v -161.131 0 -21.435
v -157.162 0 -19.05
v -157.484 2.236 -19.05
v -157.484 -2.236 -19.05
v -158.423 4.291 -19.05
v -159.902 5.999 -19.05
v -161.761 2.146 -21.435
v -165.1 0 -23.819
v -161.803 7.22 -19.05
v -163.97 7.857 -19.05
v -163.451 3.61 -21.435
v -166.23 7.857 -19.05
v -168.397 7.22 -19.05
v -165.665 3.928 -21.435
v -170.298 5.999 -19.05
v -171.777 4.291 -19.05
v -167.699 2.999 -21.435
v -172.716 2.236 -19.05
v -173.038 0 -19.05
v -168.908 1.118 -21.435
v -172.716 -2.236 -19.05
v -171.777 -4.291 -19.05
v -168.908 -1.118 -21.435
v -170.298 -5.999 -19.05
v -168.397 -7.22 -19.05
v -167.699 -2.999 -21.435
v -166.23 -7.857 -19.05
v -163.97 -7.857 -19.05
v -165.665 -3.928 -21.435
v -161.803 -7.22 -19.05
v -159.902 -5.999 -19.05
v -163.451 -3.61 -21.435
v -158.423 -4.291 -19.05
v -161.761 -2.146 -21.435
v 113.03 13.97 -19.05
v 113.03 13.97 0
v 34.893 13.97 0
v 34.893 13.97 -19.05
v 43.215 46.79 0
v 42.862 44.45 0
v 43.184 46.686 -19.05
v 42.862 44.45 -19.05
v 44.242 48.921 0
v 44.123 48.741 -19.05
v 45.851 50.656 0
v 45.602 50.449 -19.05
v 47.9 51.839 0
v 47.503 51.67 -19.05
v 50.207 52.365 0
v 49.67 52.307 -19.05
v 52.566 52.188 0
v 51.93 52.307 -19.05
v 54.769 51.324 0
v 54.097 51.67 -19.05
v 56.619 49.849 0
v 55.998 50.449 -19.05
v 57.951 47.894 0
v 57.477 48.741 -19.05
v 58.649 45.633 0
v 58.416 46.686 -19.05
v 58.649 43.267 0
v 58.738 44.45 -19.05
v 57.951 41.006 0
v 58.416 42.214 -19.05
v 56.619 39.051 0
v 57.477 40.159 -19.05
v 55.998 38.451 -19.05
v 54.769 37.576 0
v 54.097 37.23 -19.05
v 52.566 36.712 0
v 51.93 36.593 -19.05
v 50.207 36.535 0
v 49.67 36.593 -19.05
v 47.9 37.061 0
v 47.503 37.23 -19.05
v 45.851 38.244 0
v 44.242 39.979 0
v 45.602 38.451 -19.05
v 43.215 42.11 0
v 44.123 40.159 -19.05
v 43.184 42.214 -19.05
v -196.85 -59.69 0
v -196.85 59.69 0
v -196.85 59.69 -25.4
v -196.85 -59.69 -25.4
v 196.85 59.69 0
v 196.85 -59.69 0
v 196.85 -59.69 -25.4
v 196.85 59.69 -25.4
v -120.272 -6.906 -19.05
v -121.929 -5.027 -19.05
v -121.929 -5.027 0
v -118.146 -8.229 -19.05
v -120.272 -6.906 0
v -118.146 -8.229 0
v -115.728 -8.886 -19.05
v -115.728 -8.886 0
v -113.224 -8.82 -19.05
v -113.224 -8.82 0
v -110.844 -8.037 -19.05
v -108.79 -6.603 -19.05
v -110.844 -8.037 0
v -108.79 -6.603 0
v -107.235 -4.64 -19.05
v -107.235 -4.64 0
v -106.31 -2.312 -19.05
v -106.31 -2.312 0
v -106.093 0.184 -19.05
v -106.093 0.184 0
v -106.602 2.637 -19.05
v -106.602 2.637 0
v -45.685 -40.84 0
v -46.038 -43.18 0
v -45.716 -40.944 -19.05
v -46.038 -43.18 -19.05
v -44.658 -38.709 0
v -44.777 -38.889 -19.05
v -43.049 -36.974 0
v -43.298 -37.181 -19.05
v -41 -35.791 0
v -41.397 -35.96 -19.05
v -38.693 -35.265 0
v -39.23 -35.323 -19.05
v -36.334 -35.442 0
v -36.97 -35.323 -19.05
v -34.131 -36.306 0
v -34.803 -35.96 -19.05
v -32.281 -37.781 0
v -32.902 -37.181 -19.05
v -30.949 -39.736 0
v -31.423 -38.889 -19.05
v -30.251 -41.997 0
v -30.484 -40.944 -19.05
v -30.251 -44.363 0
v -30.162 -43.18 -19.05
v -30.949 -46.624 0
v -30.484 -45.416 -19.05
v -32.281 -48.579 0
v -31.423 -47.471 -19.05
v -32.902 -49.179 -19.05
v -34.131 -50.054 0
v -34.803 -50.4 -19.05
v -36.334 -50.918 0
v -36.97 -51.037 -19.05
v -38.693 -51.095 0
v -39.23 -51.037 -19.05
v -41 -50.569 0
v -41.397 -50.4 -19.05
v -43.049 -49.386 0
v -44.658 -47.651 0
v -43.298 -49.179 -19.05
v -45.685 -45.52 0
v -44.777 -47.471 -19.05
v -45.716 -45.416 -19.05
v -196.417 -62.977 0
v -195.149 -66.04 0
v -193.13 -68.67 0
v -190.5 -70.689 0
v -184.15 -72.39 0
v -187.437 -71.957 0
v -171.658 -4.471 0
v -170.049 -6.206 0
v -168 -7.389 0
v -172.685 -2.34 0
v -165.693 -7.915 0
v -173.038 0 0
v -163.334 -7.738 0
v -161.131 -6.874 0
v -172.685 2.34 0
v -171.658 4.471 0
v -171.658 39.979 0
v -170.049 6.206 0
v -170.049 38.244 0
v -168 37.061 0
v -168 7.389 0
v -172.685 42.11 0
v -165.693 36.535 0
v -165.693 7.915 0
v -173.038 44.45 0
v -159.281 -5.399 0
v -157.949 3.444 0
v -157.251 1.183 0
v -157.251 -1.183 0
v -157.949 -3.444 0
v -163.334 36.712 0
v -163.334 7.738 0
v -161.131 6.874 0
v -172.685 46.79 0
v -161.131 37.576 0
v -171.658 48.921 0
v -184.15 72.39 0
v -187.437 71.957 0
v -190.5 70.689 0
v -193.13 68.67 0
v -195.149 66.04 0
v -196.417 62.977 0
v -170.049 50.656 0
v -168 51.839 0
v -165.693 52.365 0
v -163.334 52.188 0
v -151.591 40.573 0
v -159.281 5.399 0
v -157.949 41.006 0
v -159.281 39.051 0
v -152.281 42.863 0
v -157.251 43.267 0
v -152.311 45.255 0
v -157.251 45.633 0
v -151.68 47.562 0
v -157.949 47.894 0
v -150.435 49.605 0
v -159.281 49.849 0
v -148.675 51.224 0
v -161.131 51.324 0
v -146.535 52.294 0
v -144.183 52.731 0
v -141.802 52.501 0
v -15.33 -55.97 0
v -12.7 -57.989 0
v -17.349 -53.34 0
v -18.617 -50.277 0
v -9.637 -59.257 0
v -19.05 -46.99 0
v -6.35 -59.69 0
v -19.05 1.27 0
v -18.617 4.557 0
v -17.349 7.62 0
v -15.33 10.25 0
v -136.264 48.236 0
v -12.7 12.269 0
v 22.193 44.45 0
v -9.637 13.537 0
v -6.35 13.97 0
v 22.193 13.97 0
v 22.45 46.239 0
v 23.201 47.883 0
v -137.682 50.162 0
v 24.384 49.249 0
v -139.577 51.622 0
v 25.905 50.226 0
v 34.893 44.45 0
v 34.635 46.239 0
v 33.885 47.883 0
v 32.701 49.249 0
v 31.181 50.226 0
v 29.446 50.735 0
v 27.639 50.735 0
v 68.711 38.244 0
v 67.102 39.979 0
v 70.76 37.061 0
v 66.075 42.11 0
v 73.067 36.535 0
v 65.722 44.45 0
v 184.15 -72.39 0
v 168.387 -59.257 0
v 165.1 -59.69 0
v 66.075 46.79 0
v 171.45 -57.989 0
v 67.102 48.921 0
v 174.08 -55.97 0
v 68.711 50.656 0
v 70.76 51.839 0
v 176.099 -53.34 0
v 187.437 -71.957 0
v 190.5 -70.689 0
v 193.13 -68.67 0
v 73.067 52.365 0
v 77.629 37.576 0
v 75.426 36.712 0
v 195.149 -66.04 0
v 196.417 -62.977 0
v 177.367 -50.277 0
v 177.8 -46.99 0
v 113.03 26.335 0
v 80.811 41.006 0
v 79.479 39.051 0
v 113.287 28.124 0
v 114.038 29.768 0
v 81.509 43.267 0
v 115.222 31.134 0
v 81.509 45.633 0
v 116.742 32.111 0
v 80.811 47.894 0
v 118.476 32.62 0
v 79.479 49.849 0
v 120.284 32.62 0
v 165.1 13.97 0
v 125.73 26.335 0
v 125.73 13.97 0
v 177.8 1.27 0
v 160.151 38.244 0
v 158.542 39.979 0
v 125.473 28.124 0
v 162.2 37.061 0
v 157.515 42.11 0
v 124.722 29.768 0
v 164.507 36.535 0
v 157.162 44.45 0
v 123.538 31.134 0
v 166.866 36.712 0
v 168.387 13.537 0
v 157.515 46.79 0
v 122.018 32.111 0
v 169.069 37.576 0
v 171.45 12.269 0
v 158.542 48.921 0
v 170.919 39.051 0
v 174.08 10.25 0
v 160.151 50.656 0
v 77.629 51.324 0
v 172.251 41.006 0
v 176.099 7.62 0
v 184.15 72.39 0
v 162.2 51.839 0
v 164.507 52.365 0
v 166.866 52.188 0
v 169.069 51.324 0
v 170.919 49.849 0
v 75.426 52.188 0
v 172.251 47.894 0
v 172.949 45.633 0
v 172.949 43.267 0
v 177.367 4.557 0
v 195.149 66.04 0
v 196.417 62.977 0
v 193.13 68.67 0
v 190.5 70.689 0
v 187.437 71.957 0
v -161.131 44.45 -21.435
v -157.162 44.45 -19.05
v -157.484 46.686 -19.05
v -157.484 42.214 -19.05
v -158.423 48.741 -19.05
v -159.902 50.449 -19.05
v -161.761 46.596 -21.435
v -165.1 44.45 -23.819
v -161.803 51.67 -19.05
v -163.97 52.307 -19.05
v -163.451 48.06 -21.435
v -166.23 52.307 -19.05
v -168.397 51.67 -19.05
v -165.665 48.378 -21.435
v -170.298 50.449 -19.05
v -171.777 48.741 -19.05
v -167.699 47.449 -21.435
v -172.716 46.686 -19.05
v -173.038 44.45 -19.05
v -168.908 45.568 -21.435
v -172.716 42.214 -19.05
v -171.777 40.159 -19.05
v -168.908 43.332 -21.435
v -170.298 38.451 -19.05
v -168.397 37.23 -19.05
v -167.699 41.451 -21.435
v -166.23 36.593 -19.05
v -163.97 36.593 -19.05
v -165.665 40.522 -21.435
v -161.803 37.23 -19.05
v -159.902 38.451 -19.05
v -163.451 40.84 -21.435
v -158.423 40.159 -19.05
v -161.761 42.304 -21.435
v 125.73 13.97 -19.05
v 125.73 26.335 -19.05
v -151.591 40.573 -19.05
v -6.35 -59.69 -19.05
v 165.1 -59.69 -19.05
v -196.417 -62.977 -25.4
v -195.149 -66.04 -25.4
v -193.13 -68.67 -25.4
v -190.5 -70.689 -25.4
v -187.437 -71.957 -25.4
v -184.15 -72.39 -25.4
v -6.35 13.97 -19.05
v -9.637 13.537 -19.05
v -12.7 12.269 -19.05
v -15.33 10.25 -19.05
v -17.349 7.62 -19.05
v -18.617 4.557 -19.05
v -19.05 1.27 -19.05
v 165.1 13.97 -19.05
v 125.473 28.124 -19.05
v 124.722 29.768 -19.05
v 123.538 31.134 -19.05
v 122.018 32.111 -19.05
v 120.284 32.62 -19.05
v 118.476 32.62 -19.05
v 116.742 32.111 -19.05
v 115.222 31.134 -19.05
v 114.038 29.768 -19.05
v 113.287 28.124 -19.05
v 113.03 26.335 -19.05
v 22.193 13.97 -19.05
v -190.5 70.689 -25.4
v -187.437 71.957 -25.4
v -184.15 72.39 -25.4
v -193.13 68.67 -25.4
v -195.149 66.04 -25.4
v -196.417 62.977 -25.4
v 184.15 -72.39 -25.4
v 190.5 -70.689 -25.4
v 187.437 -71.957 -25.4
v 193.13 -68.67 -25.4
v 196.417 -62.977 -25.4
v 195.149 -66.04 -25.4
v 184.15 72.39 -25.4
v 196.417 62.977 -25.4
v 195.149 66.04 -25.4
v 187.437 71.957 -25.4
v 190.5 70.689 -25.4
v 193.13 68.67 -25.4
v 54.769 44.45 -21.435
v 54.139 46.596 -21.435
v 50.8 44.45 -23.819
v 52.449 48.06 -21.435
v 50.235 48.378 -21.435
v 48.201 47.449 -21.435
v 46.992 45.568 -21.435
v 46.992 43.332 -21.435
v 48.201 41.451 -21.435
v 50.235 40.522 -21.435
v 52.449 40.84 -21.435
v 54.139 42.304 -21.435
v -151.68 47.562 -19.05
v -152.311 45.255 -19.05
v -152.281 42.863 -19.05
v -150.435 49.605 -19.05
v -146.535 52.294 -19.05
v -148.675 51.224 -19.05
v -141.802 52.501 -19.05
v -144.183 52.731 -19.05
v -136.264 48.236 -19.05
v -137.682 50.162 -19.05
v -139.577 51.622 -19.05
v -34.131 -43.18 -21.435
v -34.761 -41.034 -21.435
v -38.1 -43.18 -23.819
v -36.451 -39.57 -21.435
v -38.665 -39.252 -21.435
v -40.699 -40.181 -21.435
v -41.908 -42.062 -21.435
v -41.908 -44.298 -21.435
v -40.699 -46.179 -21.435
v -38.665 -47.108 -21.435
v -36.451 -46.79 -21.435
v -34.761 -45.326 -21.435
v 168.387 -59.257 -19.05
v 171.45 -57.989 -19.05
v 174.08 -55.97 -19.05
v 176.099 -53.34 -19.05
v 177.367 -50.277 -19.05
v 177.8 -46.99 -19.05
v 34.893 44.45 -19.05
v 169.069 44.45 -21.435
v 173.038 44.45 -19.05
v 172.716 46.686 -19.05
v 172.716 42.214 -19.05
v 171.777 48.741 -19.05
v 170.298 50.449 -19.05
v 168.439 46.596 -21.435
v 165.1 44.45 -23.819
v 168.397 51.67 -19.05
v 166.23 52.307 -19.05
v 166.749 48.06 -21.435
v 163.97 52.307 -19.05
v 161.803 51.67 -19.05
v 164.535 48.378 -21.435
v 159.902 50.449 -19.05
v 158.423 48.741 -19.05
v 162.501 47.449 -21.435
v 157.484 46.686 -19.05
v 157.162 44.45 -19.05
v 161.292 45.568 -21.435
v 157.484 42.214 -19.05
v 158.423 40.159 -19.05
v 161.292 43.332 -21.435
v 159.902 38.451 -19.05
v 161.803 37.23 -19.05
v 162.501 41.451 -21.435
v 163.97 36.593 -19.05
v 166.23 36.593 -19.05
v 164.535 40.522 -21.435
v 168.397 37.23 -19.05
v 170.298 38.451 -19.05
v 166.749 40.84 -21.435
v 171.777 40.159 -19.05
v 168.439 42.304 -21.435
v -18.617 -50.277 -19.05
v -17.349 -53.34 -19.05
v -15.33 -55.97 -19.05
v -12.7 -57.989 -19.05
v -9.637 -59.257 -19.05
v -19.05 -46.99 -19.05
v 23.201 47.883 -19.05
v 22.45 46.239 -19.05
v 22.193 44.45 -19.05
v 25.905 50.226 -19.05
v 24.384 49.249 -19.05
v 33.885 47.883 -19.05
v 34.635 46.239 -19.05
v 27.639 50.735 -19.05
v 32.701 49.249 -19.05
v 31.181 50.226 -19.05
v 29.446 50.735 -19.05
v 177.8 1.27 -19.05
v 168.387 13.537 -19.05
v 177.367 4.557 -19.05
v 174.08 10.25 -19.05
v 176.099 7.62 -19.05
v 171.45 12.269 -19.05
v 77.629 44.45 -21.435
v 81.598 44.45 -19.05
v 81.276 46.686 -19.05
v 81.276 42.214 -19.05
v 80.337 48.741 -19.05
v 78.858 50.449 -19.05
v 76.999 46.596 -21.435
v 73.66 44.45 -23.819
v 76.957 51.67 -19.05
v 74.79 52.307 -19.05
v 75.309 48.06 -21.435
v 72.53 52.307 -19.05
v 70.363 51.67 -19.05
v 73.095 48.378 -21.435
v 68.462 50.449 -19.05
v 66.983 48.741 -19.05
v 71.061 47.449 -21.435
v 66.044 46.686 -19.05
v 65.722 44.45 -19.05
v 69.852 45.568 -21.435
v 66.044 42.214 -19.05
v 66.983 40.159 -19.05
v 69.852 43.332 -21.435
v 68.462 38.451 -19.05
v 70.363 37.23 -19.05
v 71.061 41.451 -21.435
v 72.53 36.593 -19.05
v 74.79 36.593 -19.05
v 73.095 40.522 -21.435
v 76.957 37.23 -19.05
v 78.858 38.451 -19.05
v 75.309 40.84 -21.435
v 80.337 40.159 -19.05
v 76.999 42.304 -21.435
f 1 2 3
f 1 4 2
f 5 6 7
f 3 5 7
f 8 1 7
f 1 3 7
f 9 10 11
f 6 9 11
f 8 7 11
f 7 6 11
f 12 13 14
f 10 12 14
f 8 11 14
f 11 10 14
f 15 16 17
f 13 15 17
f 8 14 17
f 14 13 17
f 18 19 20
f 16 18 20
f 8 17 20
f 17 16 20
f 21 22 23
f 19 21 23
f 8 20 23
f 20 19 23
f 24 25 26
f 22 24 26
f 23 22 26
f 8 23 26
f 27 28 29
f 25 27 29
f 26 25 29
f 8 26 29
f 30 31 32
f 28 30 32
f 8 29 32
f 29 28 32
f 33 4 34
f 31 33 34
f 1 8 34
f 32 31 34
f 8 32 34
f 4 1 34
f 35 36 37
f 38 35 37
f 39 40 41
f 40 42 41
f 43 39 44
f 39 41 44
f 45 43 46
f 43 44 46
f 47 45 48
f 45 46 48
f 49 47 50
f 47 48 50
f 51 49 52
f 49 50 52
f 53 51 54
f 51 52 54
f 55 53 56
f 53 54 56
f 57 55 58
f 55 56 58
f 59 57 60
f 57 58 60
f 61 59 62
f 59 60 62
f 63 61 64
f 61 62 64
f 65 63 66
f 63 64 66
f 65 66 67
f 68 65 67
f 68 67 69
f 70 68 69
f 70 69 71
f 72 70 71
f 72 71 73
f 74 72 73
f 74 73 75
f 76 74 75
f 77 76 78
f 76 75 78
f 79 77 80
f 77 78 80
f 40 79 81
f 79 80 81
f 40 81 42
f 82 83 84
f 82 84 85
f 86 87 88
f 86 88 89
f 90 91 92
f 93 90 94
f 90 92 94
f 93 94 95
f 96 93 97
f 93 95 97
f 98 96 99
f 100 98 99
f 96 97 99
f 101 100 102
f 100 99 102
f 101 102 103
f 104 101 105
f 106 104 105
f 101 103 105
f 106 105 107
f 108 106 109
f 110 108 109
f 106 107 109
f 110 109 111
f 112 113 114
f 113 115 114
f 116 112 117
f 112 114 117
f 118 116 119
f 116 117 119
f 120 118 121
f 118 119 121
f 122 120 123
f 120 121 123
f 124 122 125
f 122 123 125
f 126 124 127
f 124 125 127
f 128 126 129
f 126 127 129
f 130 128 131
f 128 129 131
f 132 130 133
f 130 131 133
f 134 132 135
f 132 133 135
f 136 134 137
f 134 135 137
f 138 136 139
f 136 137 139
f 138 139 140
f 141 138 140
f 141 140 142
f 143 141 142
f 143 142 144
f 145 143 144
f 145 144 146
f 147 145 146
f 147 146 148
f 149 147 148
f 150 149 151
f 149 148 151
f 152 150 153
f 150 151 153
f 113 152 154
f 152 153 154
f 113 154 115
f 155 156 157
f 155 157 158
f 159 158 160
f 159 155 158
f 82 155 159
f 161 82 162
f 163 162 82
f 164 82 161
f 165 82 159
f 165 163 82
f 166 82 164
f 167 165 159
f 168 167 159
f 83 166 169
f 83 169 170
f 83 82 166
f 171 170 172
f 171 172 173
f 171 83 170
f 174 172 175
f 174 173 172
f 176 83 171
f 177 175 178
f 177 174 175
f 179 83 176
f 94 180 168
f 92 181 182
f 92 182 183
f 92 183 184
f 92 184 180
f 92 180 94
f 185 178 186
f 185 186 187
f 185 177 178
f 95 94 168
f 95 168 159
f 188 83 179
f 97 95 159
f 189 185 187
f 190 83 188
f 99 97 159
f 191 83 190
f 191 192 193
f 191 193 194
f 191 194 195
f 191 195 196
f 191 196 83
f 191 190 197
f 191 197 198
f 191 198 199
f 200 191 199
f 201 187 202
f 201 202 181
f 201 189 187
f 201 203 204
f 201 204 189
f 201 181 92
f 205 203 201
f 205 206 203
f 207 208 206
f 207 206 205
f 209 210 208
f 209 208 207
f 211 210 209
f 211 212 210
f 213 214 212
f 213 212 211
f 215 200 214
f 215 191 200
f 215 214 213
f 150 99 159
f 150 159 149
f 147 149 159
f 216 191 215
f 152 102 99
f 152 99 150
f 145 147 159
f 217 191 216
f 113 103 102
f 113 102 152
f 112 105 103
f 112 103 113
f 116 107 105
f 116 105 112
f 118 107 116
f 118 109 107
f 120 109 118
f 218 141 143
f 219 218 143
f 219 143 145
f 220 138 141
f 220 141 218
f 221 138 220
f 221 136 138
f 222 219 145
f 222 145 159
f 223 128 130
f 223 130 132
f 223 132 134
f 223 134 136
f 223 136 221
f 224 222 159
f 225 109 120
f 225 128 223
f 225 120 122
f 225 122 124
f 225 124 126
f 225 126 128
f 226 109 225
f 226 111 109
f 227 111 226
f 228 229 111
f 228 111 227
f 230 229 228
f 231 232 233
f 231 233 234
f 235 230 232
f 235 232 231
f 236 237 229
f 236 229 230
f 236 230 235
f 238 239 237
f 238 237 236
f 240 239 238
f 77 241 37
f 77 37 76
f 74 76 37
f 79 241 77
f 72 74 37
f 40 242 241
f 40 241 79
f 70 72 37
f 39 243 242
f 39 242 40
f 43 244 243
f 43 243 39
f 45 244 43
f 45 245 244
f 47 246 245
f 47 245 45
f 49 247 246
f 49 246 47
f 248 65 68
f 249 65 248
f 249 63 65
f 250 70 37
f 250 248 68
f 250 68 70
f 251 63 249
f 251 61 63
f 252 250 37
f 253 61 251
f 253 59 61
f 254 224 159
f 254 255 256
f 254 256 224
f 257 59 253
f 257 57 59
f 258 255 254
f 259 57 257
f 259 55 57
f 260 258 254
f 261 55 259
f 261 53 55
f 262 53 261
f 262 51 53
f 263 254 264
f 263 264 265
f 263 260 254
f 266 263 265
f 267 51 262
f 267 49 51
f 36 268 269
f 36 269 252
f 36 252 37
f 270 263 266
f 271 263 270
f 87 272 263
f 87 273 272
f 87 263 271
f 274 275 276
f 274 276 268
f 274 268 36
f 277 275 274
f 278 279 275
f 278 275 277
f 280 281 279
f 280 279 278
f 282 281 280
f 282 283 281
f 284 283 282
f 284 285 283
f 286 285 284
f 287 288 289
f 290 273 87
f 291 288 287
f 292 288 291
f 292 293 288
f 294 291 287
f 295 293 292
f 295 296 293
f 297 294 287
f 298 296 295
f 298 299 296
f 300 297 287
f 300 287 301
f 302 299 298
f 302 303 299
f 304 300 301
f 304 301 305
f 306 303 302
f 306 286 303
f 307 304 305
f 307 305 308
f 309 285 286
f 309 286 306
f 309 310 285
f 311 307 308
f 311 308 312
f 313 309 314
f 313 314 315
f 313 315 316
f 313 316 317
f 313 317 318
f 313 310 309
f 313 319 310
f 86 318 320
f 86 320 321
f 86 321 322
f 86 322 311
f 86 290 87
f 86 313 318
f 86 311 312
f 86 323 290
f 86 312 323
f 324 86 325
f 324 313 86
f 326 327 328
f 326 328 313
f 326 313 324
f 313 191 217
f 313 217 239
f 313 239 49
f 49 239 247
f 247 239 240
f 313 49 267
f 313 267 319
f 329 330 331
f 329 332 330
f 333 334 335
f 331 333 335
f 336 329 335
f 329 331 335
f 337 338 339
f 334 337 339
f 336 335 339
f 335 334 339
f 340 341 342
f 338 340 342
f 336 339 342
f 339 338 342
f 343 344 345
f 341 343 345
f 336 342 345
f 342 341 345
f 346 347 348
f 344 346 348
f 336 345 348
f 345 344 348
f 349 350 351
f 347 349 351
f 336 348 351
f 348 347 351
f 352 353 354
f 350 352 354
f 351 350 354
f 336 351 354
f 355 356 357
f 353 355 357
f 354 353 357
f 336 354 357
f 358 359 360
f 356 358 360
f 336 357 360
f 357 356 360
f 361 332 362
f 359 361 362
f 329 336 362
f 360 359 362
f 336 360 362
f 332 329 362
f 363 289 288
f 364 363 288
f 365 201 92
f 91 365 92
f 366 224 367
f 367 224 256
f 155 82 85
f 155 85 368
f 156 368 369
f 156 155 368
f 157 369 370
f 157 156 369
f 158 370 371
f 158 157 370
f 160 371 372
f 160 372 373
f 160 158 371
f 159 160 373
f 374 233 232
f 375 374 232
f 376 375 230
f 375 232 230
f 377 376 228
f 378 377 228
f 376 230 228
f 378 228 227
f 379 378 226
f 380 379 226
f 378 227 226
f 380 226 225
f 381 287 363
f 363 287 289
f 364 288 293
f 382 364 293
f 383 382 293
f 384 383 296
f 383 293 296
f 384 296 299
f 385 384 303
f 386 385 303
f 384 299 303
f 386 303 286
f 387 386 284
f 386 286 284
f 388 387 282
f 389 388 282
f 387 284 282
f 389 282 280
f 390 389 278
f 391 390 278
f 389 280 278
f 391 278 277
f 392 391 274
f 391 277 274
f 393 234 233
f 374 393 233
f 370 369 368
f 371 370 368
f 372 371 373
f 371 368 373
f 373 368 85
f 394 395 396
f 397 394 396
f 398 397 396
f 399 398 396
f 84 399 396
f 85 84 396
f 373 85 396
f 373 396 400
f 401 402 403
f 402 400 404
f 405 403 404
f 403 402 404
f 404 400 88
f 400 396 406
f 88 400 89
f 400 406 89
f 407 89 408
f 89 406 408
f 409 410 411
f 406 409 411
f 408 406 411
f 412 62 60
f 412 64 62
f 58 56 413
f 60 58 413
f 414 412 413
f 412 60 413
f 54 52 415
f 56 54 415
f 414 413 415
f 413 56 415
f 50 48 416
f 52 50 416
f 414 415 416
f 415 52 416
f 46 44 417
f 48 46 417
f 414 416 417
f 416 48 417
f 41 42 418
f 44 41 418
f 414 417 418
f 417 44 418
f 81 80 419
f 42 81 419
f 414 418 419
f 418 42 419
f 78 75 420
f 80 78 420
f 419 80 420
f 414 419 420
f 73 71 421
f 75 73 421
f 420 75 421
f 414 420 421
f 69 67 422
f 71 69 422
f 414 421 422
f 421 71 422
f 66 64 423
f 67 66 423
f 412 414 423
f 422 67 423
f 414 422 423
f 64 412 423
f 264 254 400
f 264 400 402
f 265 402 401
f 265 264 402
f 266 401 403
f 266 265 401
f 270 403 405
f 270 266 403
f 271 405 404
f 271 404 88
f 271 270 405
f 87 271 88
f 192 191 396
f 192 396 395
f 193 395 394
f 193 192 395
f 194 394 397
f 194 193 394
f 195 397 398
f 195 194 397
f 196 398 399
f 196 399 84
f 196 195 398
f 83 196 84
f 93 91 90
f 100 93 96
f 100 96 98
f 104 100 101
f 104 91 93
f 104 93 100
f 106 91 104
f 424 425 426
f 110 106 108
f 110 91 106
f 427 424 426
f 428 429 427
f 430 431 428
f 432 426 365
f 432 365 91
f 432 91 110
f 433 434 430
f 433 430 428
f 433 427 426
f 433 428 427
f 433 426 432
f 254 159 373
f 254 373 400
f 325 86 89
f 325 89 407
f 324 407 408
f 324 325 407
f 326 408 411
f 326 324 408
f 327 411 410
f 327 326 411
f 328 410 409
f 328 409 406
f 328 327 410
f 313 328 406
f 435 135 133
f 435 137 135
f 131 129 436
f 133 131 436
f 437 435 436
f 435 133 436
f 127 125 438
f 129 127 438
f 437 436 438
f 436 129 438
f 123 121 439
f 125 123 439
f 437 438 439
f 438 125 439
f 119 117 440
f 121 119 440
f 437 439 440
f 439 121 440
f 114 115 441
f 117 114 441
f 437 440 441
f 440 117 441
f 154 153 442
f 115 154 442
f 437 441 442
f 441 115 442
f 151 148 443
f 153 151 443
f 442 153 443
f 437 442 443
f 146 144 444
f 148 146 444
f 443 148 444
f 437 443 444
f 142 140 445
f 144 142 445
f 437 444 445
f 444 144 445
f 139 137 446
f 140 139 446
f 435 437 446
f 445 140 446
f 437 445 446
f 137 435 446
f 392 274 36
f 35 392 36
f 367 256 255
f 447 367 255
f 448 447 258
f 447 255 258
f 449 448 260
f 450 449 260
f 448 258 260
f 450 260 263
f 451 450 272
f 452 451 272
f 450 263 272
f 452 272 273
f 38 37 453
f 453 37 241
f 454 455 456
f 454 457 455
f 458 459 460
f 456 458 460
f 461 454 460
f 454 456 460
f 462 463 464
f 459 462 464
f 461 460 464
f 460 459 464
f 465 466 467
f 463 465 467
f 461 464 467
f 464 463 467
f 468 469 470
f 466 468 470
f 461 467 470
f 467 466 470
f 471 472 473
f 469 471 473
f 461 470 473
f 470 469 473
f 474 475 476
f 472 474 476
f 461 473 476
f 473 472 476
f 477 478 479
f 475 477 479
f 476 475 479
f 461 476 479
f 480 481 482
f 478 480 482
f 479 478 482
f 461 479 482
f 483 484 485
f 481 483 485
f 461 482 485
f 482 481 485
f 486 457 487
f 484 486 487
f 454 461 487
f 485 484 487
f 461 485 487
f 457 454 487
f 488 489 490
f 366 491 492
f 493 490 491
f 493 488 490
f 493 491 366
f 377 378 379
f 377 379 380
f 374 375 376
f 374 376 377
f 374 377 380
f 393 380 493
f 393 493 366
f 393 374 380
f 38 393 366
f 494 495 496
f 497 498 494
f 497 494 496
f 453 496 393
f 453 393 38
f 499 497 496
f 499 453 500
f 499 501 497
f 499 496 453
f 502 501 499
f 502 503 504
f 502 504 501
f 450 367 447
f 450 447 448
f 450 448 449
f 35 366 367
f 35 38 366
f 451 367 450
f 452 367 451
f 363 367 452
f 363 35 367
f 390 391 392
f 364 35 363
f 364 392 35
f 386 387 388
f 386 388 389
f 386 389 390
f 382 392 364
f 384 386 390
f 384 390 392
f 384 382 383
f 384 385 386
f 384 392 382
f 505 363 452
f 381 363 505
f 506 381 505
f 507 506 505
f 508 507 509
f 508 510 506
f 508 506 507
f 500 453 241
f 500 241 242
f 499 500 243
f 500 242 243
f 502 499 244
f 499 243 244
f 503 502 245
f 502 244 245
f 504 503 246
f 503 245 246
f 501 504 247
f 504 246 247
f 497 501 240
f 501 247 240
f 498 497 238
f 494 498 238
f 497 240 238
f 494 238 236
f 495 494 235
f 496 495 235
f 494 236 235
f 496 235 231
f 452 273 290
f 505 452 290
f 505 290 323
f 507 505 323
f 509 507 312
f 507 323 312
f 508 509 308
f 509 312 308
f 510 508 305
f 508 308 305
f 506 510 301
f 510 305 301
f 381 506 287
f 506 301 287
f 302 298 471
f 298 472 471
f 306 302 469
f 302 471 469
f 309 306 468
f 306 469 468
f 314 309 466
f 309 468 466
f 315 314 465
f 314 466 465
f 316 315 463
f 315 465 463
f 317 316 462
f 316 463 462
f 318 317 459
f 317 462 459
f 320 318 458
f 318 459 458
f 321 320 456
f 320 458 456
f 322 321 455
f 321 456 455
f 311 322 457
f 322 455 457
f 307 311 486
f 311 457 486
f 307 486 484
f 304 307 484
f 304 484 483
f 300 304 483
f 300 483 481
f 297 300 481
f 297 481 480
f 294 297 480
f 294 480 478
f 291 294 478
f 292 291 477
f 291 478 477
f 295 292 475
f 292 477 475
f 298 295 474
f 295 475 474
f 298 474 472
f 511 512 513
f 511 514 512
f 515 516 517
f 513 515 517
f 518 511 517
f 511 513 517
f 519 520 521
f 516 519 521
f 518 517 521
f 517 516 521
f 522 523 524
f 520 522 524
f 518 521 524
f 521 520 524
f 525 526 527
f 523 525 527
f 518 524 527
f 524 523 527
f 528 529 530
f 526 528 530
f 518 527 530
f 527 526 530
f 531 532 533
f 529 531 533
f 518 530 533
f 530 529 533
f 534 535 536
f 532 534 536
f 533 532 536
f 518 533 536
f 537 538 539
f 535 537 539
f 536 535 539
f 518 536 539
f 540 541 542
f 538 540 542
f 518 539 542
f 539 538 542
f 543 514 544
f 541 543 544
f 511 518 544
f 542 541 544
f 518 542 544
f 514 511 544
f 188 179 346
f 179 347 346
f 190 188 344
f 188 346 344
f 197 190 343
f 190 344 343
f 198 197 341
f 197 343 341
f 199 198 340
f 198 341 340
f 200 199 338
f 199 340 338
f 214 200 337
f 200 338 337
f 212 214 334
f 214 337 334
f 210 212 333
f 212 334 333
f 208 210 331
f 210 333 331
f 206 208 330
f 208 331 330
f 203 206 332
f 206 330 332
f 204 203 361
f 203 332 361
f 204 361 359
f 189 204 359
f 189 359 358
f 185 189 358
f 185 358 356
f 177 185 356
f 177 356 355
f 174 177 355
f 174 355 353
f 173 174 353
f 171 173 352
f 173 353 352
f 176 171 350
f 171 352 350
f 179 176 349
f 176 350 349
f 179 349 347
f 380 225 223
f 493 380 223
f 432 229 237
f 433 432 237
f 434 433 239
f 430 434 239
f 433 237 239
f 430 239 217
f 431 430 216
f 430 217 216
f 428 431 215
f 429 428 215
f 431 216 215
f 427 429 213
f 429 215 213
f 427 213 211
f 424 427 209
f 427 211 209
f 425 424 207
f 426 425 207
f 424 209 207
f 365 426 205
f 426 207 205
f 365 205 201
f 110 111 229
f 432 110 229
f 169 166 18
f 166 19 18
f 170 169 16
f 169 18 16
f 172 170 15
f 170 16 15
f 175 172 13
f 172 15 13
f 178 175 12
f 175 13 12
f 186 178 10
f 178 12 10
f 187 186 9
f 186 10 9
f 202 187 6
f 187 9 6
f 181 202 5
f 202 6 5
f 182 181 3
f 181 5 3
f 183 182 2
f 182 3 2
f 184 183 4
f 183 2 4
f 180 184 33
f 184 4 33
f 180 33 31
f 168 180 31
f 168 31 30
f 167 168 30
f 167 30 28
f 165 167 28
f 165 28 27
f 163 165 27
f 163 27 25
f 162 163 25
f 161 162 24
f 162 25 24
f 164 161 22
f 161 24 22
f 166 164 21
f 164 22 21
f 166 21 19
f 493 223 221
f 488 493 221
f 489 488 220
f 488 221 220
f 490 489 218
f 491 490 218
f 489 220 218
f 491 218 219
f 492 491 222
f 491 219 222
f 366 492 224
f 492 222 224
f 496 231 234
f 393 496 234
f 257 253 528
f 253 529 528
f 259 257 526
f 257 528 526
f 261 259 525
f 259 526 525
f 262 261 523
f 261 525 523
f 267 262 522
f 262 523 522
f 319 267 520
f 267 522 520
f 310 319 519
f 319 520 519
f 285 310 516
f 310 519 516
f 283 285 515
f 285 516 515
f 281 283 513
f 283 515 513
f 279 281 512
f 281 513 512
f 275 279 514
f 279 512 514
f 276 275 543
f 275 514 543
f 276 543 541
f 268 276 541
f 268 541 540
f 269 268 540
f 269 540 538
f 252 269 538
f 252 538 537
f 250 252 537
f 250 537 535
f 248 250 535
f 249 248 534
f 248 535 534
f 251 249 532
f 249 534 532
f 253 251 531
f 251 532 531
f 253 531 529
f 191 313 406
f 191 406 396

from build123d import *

# Parameters (mm, degrees)
F1_DEPTH = 25.4
F3_DEPTH = 19.05
F4_D     = 15.875
F4_DEPTH = 19.05
F4_TIP   = 4.7693311635


# Not quite as in the source:
# - a length typed as a fraction of an inch, garbled in the dataset ("3 / 203.2 mm" for 3/8 in), is restored


with BuildPart() as f1:
    # F0 (on Top) → F1 (new body)
    with BuildSketch(Plane.XY):
        with BuildLine():
            ThreePointArc((-196.85, -59.69), (-193.1302561211, -68.6702561211), (-184.15, -72.39))
            Line((-184.15, -72.39), (184.15, -72.39))
            ThreePointArc((184.15, -72.39), (193.1302561211, -68.6702561211), (196.85, -59.69))
            Line((196.85, -59.69), (196.85, 59.69))
            ThreePointArc((196.85, 59.69), (193.1302561211, 68.6702561211), (184.15, 72.39))
            Line((184.15, 72.39), (-184.15, 72.39))
            ThreePointArc((-184.15, 72.39), (-193.1302561211, 68.6702561211), (-196.85, 59.69))
            Line((-196.85, 59.69), (-196.85, -59.69))
        make_face()
    extrude(amount=-F1_DEPTH)

    # F2 (on Top) → F3 (cut)
    with BuildSketch(Plane.XY):
        with BuildLine():
            Line((22.1926261067, 13.97), (-6.35, 13.97))
            ThreePointArc((-6.35, 13.97), (-15.3302561211, 10.2502561211), (-19.05, 1.27))
            Line((-19.05, 1.27), (-19.05, -46.99))
            ThreePointArc((-19.05, -46.99), (-15.3302561211, -55.9702561211), (-6.35, -59.69))
            Line((-6.35, -59.69), (165.1, -59.69))
            ThreePointArc((165.1, -59.69), (174.0802561211, -55.9702561211), (177.8, -46.99))
            Line((177.8, -46.99), (177.8, 1.27))
            ThreePointArc((177.8, 1.27), (174.0802561211, 10.2502561211), (165.1, 13.97))
            Line((165.1, 13.97), (125.73, 13.97))
            Line((125.73, 13.97), (113.03, 13.97))
            Line((113.03, 13.97), (34.8926261067, 13.97))
            Line((34.8926261067, 13.97), (22.1926261067, 13.97))
        make_face()
        with BuildLine():
            Line((22.1926261067, 44.45), (22.1926261067, 13.97))
            Line((22.1926261067, 13.97), (34.8926261067, 13.97))
            Line((34.8926261067, 13.97), (34.8926261067, 44.45))
            ThreePointArc((34.8926261067, 44.45), (28.5426261067, 50.8), (22.1926261067, 44.45))
        make_face()
        with BuildLine():
            Line((113.03, 26.3348463923), (113.03, 13.97))
            Line((113.03, 13.97), (125.73, 13.97))
            Line((125.73, 13.97), (125.73, 26.3348463923))
            ThreePointArc((125.73, 26.3348463923), (119.38, 32.6848463923), (113.03, 26.3348463923))
        make_face()
        with BuildLine():
            ThreePointArc((-136.2642422318, 48.2357204892), (-147.6423993224, 51.8340887509), (-151.5906006098, 40.5725426972))
            Line((-151.5906006098, 40.5725426972), (-121.928781271, -5.026510451))
            ThreePointArc((-121.928781271, -5.026510451), (-110.8444944433, -8.0371380797), (-106.602422893, 2.636667341))
            Line((-106.602422893, 2.636667341), (-136.2642422318, 48.2357204892))
        make_face()
    extrude(amount=-F3_DEPTH, mode=Mode.SUBTRACT)

    # F4
    with Locations(Plane.XY):
        with Locations((-165.1, 44.45), (50.8, 44.45), (73.66, 44.45), (165.1, 44.45), (-165.1, 0), (-38.1, -43.18)):
            Hole(F4_D / 2, depth=F4_DEPTH)
            with Locations((0, 0, -(F4_DEPTH + F4_TIP / 2))):  # 118° drill point
                Cone(0, F4_D / 2, F4_TIP, mode=Mode.SUBTRACT)


solid = f1.part
